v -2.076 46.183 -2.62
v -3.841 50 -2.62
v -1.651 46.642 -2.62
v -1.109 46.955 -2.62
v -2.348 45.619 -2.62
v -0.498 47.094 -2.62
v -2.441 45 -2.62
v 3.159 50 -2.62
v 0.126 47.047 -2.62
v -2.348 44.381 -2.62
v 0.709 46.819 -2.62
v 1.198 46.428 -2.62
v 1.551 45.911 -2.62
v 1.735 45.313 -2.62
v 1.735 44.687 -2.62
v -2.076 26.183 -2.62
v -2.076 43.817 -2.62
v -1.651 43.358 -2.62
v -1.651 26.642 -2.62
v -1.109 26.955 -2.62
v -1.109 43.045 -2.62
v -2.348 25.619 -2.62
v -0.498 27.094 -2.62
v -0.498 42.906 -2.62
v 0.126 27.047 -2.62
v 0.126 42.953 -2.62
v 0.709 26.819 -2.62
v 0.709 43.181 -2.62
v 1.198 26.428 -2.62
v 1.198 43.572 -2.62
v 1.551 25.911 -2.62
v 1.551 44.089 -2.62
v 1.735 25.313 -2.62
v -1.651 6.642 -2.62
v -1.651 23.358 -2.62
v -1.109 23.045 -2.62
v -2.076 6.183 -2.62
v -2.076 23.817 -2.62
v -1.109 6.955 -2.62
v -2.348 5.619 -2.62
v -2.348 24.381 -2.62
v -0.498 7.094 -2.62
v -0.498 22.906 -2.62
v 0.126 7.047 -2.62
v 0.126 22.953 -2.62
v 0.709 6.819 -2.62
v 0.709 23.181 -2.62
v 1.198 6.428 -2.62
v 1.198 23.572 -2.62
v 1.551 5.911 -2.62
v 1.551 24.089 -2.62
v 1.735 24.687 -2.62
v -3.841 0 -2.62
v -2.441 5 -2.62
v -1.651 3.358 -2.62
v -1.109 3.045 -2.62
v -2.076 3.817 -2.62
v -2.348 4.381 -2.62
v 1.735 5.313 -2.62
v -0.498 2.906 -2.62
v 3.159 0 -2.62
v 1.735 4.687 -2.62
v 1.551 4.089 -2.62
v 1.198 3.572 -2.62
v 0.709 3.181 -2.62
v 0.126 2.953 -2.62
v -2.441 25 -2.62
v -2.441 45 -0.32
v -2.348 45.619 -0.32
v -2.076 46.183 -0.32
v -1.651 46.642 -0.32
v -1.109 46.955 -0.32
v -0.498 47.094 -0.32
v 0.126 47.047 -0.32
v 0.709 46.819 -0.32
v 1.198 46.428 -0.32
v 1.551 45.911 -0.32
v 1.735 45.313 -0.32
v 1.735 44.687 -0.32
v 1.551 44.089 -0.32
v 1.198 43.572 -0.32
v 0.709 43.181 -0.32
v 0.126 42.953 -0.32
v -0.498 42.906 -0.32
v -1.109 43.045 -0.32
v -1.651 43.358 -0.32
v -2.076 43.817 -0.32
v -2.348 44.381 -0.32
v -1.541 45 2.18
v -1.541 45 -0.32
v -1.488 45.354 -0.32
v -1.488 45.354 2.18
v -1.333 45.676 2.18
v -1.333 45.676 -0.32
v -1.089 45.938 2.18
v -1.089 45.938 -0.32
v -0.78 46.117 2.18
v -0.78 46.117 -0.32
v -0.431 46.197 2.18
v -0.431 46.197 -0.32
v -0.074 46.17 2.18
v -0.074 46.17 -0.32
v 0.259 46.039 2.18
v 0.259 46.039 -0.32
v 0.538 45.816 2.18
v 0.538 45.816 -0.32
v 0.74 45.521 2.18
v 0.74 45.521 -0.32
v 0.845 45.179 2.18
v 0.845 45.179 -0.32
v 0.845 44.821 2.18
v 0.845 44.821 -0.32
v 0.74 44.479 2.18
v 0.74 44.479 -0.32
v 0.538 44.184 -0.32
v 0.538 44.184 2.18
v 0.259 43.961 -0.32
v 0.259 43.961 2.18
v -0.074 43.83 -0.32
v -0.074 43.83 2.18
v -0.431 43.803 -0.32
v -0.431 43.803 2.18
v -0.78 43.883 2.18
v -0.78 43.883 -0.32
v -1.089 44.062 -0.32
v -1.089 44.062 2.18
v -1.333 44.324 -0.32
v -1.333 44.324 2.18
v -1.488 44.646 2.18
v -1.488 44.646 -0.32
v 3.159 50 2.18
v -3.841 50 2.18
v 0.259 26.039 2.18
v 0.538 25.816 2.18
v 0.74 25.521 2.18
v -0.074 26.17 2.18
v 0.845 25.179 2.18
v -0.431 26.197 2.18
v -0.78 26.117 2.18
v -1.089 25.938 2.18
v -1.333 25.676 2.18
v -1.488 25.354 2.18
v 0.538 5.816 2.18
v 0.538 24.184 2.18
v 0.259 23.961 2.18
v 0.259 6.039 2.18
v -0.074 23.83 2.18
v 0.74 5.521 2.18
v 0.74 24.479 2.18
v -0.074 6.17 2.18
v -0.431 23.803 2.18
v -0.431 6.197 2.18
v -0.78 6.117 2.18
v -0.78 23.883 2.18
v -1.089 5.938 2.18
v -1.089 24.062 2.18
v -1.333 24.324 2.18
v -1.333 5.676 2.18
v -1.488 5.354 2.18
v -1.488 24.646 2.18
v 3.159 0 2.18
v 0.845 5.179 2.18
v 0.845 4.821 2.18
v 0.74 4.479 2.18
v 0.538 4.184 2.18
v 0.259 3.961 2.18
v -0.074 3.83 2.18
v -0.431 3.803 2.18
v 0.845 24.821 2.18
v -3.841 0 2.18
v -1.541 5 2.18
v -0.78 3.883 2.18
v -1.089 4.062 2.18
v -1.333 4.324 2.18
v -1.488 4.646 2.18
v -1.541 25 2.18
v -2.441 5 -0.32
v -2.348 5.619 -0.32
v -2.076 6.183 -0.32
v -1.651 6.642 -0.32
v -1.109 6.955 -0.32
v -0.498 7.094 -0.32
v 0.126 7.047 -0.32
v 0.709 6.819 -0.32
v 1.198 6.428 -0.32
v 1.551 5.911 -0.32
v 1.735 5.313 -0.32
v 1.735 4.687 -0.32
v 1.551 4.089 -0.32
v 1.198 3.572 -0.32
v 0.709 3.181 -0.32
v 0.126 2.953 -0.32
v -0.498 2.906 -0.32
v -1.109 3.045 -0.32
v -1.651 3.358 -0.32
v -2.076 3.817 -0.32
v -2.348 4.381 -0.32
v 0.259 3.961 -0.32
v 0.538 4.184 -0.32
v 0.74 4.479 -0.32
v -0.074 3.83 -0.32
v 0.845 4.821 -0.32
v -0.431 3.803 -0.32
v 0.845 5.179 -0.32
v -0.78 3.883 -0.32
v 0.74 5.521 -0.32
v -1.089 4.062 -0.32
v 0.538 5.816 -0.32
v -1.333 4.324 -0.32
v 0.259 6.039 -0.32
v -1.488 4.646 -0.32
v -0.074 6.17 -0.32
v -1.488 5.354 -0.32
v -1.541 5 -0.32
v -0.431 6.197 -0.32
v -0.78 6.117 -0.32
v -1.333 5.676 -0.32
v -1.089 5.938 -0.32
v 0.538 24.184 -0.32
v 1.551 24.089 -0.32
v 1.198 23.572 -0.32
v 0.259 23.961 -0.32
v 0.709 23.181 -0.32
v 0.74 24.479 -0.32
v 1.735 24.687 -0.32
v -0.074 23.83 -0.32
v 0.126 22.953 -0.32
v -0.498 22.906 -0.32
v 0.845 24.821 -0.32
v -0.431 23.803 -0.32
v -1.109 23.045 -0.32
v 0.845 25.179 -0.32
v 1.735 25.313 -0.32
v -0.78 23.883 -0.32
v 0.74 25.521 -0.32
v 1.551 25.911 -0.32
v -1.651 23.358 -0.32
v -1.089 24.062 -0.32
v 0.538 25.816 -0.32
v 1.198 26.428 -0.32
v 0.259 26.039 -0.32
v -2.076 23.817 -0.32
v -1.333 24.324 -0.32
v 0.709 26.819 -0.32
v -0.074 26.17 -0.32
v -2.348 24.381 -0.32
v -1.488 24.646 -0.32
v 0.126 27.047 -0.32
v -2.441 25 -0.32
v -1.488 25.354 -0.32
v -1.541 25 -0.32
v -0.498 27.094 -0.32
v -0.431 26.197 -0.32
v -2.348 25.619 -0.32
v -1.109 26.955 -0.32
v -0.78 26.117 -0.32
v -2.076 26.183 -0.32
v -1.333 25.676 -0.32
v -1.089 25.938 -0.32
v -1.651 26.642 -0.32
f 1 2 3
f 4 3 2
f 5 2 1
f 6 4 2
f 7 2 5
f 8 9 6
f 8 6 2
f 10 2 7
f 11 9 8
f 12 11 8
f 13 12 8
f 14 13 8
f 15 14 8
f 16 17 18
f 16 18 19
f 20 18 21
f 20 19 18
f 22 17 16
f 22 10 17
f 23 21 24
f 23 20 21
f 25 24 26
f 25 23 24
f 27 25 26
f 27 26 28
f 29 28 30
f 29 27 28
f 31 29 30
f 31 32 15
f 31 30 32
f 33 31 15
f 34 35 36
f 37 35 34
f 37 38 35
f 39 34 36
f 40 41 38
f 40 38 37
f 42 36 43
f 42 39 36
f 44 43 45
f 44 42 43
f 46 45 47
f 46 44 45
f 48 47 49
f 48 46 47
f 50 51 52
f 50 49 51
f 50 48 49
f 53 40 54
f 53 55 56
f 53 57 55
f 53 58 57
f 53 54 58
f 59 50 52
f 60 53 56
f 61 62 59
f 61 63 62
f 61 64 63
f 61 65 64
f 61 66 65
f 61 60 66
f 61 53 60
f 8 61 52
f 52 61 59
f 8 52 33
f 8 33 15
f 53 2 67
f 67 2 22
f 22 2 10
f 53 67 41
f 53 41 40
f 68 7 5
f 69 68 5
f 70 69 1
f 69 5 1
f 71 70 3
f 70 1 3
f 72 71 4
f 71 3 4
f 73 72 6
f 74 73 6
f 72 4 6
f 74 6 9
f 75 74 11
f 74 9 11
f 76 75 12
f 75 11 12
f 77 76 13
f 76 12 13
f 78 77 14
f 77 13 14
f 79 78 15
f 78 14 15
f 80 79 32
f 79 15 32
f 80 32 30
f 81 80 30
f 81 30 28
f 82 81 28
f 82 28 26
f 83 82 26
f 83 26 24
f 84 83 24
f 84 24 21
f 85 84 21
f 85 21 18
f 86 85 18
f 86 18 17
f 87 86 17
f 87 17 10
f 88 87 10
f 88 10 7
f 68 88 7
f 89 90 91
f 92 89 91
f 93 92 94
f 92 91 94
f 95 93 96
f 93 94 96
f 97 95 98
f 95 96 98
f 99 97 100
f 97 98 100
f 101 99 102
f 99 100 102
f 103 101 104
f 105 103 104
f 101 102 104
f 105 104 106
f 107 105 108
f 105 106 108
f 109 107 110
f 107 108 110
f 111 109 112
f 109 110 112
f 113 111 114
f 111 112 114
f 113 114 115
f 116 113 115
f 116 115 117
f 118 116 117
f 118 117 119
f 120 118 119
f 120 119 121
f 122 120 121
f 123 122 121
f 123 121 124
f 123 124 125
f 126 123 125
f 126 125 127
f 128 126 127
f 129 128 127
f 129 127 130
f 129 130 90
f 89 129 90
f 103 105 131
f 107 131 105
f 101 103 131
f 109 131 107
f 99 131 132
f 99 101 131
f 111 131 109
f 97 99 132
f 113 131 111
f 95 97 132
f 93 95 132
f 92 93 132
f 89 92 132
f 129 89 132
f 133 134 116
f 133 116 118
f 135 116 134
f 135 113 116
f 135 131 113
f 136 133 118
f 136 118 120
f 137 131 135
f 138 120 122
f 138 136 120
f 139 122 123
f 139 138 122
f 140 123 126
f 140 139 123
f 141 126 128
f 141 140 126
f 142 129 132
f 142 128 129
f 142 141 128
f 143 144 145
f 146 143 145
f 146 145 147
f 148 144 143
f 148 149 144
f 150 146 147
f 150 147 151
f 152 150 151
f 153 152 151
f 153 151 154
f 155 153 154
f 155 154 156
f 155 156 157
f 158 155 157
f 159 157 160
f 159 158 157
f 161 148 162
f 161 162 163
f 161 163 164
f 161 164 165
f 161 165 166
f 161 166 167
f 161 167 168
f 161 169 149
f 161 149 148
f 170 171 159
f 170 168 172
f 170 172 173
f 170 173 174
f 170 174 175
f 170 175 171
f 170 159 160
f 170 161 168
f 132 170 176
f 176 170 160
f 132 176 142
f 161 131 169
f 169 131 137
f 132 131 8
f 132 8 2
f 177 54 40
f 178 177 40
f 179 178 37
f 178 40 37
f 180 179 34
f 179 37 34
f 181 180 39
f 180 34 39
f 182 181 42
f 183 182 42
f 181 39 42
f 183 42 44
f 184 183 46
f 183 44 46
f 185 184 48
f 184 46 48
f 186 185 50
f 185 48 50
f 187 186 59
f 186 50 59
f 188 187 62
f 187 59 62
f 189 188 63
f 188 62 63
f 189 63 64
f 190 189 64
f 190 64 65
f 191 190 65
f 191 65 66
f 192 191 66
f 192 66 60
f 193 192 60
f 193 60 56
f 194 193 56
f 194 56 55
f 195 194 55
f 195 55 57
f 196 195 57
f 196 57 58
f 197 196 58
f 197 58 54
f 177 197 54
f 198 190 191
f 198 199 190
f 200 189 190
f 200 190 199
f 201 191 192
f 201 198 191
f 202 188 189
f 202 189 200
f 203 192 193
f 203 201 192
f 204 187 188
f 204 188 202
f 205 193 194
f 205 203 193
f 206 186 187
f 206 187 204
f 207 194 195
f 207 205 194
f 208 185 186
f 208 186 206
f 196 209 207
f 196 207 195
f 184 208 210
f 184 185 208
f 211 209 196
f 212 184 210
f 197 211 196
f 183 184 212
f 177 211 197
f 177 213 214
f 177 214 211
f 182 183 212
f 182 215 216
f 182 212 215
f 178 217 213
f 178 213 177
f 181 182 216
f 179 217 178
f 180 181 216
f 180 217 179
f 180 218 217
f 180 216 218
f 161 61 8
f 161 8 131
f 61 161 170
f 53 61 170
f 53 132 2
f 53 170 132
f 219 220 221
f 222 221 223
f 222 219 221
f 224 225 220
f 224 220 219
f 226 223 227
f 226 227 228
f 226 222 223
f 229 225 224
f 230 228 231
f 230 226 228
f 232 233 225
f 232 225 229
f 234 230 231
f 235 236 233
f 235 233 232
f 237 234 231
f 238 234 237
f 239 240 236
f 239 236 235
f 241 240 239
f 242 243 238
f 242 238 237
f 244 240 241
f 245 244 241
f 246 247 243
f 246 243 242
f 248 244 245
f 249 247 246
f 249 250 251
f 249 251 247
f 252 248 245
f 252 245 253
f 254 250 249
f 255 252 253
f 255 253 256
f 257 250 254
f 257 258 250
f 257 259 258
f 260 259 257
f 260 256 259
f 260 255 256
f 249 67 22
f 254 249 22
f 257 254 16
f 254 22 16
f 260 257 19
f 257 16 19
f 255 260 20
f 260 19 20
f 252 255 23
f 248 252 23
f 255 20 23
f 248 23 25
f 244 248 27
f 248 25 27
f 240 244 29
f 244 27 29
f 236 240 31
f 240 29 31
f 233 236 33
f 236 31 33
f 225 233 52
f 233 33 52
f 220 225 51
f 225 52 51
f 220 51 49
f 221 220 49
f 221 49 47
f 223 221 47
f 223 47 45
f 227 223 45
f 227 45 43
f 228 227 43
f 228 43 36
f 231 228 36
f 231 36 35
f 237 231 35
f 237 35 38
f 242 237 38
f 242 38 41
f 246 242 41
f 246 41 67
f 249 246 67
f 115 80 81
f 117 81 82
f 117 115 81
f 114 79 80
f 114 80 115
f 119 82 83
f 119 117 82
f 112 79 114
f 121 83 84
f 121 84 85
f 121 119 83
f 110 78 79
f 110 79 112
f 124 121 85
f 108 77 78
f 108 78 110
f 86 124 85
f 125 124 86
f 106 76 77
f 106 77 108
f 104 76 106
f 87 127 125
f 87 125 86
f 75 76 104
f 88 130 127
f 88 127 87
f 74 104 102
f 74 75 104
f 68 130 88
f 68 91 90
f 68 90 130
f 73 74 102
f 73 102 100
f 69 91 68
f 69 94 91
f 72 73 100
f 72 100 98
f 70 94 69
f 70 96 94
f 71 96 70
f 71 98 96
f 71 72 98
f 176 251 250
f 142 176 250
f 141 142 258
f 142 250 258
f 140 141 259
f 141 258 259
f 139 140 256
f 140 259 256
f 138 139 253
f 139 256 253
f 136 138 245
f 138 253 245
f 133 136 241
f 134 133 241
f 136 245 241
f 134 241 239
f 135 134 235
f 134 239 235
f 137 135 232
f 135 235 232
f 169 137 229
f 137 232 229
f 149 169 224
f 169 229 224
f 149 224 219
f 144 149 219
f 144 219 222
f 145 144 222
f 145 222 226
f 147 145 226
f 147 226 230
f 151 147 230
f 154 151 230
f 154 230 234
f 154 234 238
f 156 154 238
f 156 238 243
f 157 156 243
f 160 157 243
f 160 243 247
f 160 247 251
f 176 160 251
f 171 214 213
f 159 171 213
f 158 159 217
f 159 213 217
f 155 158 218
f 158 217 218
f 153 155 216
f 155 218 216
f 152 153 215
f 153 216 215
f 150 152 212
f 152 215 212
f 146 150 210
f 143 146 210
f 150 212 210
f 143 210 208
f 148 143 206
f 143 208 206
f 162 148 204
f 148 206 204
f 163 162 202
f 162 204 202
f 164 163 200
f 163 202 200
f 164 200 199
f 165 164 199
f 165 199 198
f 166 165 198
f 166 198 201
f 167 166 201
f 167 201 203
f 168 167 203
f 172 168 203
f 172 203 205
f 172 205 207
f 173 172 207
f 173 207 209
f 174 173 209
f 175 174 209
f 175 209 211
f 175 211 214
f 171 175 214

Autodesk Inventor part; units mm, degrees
ref_plane "YZ Plane" through (0, 0, 0) normal (1, 0, 0) x (0, 1, 0)
ref_plane "XZ Plane" through (0, 0, 0) normal (0, 1, 0) x (-1, 0, 0)
ref_plane "XY Plane" through (0, 0, 0) normal (0, 0, 1) x (1, 0, 0)
sketch "Sketch1" plane through (0, 0, 0) normal (0, 1, 0) x (-1, 0, 0)
  line L0 (3.8413, -2.6197) -> (-3.1587, -2.6197)
  line L1 (-3.1587, -2.6197) -> (-3.1587, 2.1803)
  line L2 (-3.1587, 2.1803) -> (3.8413, 2.1803)
  line L3 (3.8413, 2.1803) -> (3.8413, -2.6197)
  point P0 (0, 0)
  dimension "d0" = 4.8
  dimension "d1" = 7
extrude "Extrusion1" add sketch "Sketch1" along normal blind 50
sketch "Sketch2" plane through (3.1587, 0, -2.6197) normal (0, 0, -1) x (-1, 0, 0)
  circle A0 centre (3.5, 5) radius 1.2
  line L0 (0, 0) -> (7, 0) projected
  line L1 (7, 0) -> (7, 50) projected
  circle A1 centre (3.5, 25) radius 1.2
  circle A2 centre (3.5, 45) radius 1.2
  point P0 (3.1587, 0)
  dimension "d4" = 2.4
  dimension "d5" = 5
  dimension "d6" = 3.5
  dimension "d9" = 20
extrude "Extrusion2" cut sketch "Sketch2" against normal through all
sketch "Sketch3" plane through (3.1587, 0, -2.6197) normal (0, 0, -1) x (-1, 0, 0)
  circle A0 centre (3.5, 45) radius 1.2 projected
  circle A1 centre (3.5, 45) radius 2.1
  circle A2 centre (3.5, 25) radius 1.2 projected
  circle A3 centre (3.5, 25) radius 2.1
  circle A4 centre (3.5, 5) radius 1.2 projected
  circle A5 centre (3.5, 5) radius 2.1
  point P0 (3.1587, 0)
  dimension "d16" = 4.2
  dimension "d17" = 4.2
  dimension "d18" = 4.2
extrude "Extrusion3" cut sketch "Sketch3" against normal blind 2.3 contours A0 | A1 | A2 | A3 | A4 | A5
properties part number "MGN7c_50mm_rail"
